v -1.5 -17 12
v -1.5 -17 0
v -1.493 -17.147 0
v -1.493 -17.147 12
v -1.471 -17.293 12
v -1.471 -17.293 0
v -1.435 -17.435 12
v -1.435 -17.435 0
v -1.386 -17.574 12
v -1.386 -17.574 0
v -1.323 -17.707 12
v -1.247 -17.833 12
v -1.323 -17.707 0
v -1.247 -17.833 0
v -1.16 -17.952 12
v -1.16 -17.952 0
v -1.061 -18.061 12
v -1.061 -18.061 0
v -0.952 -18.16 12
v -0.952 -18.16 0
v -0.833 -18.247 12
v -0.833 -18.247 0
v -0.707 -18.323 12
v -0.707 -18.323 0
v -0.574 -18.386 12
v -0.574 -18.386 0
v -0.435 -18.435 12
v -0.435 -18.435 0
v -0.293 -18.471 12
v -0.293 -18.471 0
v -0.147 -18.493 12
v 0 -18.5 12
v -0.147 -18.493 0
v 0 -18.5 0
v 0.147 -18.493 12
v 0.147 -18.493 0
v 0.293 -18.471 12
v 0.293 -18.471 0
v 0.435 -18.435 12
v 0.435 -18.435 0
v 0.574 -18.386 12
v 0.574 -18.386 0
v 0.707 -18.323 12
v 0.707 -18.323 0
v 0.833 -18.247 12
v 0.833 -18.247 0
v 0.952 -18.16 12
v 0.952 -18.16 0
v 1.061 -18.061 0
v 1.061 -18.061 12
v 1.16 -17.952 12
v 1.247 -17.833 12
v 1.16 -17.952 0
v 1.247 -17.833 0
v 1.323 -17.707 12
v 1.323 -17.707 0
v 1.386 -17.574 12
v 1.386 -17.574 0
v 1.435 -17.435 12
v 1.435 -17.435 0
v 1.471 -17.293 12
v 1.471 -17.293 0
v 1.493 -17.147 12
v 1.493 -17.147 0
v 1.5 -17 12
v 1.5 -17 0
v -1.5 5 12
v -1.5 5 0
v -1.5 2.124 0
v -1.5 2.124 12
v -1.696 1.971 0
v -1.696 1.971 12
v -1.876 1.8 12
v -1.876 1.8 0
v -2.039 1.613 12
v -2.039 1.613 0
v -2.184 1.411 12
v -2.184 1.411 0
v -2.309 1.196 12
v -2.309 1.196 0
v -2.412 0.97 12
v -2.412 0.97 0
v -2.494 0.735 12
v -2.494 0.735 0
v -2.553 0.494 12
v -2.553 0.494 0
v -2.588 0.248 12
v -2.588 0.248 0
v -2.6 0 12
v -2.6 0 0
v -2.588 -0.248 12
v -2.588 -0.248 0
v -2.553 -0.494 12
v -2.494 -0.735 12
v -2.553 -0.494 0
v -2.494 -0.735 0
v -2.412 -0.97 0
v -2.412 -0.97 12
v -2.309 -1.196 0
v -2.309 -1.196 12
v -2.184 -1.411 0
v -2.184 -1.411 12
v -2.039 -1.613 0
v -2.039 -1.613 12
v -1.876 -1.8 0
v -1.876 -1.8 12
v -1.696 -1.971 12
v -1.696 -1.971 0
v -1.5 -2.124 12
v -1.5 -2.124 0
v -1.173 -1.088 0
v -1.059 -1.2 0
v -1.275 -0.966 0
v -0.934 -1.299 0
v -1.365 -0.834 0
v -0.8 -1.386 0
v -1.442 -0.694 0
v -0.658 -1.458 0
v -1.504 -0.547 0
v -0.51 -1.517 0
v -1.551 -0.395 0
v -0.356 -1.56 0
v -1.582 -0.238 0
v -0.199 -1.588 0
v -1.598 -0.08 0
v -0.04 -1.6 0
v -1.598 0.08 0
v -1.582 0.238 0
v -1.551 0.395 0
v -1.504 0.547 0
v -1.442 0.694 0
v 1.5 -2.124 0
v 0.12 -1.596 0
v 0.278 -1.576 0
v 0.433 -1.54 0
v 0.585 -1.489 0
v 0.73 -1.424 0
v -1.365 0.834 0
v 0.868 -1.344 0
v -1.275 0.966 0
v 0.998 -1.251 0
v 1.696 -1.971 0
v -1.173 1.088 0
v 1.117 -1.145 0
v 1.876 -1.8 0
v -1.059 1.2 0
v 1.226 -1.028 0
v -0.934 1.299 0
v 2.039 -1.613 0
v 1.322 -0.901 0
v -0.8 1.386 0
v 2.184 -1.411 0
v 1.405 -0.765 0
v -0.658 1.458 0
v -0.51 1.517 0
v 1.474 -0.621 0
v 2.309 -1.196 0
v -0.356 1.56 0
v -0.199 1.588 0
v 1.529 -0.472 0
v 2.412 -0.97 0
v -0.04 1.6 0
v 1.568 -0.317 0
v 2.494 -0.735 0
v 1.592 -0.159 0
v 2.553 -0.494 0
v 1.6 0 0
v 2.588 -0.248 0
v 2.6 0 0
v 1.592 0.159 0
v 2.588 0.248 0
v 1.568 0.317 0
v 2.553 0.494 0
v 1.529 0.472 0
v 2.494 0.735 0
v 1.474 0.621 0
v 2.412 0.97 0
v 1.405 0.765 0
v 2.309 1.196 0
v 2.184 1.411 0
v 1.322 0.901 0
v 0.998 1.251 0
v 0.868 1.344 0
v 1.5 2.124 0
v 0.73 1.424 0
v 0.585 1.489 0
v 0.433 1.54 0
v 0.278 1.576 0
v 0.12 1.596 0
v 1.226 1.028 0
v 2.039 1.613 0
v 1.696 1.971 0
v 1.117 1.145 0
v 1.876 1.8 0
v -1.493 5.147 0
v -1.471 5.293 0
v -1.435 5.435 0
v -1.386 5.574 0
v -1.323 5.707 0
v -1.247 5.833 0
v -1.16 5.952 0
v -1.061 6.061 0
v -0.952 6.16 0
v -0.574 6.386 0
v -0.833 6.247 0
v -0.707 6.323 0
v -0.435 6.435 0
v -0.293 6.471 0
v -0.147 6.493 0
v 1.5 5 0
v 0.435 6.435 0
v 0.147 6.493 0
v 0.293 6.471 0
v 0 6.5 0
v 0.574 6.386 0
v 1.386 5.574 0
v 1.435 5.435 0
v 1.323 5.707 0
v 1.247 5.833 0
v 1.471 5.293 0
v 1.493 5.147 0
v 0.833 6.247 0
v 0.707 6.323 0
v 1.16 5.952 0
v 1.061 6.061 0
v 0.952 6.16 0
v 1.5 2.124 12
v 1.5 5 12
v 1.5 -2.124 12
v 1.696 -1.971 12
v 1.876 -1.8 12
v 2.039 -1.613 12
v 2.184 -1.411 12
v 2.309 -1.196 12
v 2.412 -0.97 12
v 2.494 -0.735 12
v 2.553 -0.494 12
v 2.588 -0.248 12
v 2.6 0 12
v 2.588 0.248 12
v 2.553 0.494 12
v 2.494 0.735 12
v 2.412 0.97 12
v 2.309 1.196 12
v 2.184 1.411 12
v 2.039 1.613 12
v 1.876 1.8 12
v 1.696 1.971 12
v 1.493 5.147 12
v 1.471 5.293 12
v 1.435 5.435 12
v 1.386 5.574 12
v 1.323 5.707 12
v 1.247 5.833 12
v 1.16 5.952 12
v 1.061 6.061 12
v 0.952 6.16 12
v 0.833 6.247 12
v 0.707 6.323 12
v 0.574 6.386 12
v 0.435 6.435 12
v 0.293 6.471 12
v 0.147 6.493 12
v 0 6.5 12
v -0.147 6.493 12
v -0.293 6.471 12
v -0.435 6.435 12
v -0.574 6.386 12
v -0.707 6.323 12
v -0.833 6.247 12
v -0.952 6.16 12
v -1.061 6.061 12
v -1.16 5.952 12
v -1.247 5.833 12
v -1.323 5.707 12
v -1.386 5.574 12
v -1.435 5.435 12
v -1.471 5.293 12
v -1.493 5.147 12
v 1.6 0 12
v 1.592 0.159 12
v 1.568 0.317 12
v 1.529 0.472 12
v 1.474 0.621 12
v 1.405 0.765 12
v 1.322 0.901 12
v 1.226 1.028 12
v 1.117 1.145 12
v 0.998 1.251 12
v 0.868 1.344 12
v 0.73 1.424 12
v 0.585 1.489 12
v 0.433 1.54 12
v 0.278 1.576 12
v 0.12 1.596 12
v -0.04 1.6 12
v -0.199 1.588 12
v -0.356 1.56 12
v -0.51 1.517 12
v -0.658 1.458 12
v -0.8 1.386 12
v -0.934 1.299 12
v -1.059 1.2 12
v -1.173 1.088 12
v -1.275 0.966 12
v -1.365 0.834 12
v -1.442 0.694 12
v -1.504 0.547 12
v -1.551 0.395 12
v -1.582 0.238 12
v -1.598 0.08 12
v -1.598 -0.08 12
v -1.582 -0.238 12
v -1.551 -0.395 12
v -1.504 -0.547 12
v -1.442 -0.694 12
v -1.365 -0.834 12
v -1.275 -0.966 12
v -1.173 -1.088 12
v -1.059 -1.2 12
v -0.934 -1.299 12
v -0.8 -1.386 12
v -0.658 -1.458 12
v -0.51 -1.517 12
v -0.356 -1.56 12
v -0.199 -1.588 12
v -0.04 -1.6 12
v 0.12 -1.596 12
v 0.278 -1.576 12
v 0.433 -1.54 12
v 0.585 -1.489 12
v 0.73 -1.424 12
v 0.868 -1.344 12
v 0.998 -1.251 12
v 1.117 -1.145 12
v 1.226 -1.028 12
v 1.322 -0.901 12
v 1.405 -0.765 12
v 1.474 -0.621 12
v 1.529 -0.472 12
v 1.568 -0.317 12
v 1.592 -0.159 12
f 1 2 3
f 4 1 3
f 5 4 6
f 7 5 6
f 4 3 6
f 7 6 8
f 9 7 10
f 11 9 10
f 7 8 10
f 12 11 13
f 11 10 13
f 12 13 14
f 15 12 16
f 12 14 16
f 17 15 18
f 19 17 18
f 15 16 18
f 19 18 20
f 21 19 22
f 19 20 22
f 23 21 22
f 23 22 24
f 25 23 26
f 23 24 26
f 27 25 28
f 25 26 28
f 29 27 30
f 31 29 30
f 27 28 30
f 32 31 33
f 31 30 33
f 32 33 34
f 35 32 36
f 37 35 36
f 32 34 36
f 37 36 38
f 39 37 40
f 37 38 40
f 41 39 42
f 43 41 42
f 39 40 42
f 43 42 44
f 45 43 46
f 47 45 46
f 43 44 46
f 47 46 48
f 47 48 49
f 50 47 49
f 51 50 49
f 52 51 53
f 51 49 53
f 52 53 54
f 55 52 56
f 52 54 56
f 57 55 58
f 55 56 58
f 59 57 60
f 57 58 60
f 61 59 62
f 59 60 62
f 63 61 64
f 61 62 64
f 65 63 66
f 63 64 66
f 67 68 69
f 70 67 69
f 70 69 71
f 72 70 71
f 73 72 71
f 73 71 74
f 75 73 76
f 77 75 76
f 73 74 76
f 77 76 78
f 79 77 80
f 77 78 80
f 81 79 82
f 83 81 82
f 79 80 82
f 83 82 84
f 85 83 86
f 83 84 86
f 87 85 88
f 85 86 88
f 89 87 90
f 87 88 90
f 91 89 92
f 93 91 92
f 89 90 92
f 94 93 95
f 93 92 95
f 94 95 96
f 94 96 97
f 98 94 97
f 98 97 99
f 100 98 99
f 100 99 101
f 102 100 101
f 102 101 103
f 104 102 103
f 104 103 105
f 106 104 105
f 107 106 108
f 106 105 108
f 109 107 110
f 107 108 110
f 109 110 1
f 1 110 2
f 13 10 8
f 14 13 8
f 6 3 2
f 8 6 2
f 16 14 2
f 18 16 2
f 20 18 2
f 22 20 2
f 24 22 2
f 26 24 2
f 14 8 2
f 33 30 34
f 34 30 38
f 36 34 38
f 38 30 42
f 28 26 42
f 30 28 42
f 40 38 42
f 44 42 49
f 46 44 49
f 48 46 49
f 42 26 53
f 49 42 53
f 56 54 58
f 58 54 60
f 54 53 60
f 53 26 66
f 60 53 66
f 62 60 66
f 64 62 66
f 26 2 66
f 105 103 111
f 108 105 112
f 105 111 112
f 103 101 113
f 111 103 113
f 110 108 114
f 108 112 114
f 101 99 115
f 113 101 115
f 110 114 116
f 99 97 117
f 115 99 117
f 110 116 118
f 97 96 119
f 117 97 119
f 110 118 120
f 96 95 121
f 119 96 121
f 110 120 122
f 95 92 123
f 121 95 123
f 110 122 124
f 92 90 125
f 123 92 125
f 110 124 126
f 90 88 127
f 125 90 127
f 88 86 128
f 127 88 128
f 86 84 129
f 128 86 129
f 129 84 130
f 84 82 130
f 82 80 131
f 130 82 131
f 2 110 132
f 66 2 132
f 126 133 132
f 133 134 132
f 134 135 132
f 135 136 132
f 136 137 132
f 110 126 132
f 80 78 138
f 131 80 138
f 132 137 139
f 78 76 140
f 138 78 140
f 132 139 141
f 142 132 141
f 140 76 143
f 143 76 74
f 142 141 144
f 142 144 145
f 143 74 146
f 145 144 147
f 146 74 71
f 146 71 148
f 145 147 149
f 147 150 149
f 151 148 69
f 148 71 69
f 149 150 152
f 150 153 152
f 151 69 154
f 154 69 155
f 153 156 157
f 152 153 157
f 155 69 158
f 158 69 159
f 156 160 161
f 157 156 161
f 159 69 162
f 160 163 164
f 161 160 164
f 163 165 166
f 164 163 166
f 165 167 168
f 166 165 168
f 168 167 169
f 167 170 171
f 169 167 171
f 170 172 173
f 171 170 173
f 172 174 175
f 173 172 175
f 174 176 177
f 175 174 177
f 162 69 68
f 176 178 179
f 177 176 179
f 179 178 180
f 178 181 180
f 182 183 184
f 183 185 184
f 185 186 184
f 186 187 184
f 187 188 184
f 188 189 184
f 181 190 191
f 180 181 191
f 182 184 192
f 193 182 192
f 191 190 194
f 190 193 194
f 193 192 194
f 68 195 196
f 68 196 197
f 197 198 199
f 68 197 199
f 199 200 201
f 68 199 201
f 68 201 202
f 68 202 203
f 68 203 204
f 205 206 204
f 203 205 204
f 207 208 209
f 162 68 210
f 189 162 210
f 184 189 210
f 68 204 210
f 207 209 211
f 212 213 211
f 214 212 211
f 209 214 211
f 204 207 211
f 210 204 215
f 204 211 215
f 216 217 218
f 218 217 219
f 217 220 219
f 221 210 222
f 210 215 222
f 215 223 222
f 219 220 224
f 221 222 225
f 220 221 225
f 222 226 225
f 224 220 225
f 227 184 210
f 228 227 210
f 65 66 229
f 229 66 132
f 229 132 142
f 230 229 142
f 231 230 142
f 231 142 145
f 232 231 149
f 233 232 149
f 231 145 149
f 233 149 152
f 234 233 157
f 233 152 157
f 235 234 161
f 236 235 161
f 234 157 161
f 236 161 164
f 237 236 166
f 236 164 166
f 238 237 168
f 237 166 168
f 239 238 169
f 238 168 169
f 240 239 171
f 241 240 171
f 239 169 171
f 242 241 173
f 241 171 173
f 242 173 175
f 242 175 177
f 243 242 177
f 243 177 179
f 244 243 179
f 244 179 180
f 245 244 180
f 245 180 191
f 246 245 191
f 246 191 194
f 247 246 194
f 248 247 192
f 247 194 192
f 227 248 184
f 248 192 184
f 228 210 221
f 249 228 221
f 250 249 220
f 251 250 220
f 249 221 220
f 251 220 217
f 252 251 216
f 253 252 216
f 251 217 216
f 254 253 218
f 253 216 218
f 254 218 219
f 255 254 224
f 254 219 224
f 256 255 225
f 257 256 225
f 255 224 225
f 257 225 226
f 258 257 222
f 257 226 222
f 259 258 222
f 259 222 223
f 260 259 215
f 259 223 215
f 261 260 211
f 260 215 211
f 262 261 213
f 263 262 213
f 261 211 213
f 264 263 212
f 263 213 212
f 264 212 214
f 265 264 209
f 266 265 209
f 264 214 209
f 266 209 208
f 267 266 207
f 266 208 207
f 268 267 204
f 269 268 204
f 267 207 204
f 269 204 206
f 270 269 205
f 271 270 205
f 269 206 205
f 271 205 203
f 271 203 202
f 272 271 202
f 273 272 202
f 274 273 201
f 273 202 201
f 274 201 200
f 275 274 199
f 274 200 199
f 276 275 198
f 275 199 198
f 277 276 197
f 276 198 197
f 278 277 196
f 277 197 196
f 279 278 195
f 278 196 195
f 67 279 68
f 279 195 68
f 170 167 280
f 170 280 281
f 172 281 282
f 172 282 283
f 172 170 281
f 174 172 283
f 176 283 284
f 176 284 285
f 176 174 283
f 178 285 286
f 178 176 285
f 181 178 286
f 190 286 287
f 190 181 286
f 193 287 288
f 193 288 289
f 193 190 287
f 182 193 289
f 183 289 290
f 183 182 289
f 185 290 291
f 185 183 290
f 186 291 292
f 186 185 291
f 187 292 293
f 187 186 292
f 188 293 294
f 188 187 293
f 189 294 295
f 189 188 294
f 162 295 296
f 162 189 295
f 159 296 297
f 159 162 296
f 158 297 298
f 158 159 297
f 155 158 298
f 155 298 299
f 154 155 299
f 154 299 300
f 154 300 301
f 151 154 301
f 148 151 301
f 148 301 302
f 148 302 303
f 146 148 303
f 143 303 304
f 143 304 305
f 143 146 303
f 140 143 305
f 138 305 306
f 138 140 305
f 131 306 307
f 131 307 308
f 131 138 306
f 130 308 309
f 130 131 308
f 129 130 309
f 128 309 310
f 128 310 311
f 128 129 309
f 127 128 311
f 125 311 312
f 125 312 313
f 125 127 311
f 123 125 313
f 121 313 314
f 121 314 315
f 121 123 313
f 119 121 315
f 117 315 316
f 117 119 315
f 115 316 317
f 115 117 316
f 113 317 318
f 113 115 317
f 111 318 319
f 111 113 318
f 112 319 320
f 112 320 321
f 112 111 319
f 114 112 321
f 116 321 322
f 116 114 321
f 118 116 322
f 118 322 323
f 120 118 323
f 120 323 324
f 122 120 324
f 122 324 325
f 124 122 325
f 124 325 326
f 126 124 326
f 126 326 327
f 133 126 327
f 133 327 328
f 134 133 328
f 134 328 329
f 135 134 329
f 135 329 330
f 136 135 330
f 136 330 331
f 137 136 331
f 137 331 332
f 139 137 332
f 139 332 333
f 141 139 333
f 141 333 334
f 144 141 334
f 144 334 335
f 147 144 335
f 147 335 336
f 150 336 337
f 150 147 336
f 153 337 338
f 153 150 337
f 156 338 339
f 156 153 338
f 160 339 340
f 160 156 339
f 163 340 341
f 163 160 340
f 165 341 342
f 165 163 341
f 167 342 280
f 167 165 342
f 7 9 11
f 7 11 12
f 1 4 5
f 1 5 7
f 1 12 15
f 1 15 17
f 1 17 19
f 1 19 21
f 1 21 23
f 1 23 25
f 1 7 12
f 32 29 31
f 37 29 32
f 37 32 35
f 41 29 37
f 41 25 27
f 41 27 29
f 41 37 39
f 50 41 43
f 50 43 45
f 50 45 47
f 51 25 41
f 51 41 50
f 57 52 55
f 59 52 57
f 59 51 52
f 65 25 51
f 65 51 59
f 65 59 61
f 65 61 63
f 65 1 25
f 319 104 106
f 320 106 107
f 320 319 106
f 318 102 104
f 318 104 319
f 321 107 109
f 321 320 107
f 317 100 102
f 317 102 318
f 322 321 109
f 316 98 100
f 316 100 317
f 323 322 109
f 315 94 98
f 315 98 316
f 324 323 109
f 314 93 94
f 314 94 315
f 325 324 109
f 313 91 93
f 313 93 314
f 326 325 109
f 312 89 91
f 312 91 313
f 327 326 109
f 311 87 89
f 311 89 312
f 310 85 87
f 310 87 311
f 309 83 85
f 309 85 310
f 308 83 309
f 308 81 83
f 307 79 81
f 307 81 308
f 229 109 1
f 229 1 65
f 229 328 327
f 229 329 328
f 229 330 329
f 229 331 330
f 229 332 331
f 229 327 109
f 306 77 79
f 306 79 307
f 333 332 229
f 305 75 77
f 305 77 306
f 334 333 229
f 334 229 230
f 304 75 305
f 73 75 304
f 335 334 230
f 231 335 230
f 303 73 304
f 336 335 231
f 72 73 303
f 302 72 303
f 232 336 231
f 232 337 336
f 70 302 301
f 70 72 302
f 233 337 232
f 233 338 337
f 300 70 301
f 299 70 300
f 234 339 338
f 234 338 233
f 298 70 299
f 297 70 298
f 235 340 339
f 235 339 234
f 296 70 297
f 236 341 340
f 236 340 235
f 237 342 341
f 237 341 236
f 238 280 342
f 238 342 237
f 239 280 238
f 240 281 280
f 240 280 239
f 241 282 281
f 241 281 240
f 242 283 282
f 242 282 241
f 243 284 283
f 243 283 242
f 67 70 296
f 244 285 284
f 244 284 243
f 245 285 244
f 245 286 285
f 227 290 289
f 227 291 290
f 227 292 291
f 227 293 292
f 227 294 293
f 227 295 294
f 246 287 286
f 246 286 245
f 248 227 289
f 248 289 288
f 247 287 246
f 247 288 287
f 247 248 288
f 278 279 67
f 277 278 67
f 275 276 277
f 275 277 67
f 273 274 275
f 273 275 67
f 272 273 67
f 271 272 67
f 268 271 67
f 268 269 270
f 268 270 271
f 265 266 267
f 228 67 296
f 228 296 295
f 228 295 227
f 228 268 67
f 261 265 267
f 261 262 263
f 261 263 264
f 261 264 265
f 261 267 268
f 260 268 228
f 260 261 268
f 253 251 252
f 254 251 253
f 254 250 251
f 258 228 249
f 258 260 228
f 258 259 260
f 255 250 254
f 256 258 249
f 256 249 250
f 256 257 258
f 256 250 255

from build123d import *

# Parameters (mm, degrees)
SKETCH_1_R      = 1.6
EXTRUDE_1_DEPTH = 12


with BuildPart() as part:
    # 草图1 → 凸台-拉伸1 (new body)
    with BuildSketch(Plane.XY):
        with BuildLine():
            ThreePointArc((-1.5, 2.123676058), (-2.6, 0), (-1.5, -2.123676058))
            Line((-1.5, -2.123676058), (-1.5, -17))
            ThreePointArc((-1.5, -17), (0, -18.5), (1.5, -17))
            Line((1.5, -17), (1.5, -2.123676058))
            ThreePointArc((1.5, -2.123676058), (2.6, 0), (1.5, 2.123676058))
            Line((1.5, 2.123676058), (1.5, 5))
            ThreePointArc((1.5, 5), (0, 6.5), (-1.5, 5))
            Line((-1.5, 5), (-1.5, 2.123676058))
        make_face()
        Circle(SKETCH_1_R, mode=Mode.SUBTRACT)
    extrude(amount=EXTRUDE_1_DEPTH)


solid = part.part
